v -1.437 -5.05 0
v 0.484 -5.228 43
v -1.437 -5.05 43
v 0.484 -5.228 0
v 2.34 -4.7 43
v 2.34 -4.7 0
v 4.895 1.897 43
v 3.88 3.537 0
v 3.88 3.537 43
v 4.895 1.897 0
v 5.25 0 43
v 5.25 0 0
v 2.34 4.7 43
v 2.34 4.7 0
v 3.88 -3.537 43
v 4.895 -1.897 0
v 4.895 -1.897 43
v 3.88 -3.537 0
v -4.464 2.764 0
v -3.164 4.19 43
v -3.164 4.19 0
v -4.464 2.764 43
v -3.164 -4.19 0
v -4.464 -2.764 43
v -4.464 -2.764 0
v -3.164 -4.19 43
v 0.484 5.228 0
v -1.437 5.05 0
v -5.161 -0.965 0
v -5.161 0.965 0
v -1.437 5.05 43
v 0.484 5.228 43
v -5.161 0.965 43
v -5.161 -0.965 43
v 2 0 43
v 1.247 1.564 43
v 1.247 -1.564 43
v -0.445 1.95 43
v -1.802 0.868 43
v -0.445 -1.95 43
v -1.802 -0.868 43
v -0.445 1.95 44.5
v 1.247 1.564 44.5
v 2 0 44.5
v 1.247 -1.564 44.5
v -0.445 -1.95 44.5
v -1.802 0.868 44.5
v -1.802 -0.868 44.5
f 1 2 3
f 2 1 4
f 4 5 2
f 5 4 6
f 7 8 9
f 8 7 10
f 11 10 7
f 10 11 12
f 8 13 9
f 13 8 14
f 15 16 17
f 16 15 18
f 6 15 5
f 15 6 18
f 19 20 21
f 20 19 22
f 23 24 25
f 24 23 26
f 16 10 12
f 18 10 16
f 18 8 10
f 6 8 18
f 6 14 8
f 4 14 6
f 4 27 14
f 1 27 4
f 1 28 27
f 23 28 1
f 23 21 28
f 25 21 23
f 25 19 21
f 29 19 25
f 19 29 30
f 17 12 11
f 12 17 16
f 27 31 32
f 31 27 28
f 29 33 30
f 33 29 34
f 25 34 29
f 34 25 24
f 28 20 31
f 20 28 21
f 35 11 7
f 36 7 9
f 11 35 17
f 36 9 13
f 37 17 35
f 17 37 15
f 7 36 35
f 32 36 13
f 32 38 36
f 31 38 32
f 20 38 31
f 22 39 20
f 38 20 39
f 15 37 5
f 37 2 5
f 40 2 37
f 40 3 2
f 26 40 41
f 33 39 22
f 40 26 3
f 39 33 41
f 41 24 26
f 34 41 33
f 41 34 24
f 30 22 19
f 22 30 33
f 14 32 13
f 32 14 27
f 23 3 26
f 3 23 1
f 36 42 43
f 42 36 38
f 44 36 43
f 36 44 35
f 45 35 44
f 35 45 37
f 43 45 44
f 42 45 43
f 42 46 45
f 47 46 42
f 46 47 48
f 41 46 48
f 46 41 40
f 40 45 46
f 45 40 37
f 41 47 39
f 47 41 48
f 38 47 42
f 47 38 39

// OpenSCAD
// Battery Cylindrical Cell Model

// Parameters
battery_height = 44.5;
battery_diameter = 10.5;
positive_terminal_height = 1.5;
positive_terminal_diameter = 4.0;

// Battery cylindrical body
module battery_cylindrical_body() {
    cylinder(h = battery_height - positive_terminal_height, d = battery_diameter, center = false);
}

// Positive terminal button
module positive_terminal_button() {
    translate([0, 0, battery_height - positive_terminal_height])
        cylinder(h = positive_terminal_height, d = positive_terminal_diameter, center = false);
}

// Negative terminal contact face
module negative_terminal_contact_face() {
    translate([0, 0, 0])
        cylinder(h = 0.1, d = battery_diameter, center = false);
}

// Complete battery model
module battery() {
    battery_cylindrical_body();
    positive_terminal_button();
    negative_terminal_contact_face();
}

// Render the battery
battery();
